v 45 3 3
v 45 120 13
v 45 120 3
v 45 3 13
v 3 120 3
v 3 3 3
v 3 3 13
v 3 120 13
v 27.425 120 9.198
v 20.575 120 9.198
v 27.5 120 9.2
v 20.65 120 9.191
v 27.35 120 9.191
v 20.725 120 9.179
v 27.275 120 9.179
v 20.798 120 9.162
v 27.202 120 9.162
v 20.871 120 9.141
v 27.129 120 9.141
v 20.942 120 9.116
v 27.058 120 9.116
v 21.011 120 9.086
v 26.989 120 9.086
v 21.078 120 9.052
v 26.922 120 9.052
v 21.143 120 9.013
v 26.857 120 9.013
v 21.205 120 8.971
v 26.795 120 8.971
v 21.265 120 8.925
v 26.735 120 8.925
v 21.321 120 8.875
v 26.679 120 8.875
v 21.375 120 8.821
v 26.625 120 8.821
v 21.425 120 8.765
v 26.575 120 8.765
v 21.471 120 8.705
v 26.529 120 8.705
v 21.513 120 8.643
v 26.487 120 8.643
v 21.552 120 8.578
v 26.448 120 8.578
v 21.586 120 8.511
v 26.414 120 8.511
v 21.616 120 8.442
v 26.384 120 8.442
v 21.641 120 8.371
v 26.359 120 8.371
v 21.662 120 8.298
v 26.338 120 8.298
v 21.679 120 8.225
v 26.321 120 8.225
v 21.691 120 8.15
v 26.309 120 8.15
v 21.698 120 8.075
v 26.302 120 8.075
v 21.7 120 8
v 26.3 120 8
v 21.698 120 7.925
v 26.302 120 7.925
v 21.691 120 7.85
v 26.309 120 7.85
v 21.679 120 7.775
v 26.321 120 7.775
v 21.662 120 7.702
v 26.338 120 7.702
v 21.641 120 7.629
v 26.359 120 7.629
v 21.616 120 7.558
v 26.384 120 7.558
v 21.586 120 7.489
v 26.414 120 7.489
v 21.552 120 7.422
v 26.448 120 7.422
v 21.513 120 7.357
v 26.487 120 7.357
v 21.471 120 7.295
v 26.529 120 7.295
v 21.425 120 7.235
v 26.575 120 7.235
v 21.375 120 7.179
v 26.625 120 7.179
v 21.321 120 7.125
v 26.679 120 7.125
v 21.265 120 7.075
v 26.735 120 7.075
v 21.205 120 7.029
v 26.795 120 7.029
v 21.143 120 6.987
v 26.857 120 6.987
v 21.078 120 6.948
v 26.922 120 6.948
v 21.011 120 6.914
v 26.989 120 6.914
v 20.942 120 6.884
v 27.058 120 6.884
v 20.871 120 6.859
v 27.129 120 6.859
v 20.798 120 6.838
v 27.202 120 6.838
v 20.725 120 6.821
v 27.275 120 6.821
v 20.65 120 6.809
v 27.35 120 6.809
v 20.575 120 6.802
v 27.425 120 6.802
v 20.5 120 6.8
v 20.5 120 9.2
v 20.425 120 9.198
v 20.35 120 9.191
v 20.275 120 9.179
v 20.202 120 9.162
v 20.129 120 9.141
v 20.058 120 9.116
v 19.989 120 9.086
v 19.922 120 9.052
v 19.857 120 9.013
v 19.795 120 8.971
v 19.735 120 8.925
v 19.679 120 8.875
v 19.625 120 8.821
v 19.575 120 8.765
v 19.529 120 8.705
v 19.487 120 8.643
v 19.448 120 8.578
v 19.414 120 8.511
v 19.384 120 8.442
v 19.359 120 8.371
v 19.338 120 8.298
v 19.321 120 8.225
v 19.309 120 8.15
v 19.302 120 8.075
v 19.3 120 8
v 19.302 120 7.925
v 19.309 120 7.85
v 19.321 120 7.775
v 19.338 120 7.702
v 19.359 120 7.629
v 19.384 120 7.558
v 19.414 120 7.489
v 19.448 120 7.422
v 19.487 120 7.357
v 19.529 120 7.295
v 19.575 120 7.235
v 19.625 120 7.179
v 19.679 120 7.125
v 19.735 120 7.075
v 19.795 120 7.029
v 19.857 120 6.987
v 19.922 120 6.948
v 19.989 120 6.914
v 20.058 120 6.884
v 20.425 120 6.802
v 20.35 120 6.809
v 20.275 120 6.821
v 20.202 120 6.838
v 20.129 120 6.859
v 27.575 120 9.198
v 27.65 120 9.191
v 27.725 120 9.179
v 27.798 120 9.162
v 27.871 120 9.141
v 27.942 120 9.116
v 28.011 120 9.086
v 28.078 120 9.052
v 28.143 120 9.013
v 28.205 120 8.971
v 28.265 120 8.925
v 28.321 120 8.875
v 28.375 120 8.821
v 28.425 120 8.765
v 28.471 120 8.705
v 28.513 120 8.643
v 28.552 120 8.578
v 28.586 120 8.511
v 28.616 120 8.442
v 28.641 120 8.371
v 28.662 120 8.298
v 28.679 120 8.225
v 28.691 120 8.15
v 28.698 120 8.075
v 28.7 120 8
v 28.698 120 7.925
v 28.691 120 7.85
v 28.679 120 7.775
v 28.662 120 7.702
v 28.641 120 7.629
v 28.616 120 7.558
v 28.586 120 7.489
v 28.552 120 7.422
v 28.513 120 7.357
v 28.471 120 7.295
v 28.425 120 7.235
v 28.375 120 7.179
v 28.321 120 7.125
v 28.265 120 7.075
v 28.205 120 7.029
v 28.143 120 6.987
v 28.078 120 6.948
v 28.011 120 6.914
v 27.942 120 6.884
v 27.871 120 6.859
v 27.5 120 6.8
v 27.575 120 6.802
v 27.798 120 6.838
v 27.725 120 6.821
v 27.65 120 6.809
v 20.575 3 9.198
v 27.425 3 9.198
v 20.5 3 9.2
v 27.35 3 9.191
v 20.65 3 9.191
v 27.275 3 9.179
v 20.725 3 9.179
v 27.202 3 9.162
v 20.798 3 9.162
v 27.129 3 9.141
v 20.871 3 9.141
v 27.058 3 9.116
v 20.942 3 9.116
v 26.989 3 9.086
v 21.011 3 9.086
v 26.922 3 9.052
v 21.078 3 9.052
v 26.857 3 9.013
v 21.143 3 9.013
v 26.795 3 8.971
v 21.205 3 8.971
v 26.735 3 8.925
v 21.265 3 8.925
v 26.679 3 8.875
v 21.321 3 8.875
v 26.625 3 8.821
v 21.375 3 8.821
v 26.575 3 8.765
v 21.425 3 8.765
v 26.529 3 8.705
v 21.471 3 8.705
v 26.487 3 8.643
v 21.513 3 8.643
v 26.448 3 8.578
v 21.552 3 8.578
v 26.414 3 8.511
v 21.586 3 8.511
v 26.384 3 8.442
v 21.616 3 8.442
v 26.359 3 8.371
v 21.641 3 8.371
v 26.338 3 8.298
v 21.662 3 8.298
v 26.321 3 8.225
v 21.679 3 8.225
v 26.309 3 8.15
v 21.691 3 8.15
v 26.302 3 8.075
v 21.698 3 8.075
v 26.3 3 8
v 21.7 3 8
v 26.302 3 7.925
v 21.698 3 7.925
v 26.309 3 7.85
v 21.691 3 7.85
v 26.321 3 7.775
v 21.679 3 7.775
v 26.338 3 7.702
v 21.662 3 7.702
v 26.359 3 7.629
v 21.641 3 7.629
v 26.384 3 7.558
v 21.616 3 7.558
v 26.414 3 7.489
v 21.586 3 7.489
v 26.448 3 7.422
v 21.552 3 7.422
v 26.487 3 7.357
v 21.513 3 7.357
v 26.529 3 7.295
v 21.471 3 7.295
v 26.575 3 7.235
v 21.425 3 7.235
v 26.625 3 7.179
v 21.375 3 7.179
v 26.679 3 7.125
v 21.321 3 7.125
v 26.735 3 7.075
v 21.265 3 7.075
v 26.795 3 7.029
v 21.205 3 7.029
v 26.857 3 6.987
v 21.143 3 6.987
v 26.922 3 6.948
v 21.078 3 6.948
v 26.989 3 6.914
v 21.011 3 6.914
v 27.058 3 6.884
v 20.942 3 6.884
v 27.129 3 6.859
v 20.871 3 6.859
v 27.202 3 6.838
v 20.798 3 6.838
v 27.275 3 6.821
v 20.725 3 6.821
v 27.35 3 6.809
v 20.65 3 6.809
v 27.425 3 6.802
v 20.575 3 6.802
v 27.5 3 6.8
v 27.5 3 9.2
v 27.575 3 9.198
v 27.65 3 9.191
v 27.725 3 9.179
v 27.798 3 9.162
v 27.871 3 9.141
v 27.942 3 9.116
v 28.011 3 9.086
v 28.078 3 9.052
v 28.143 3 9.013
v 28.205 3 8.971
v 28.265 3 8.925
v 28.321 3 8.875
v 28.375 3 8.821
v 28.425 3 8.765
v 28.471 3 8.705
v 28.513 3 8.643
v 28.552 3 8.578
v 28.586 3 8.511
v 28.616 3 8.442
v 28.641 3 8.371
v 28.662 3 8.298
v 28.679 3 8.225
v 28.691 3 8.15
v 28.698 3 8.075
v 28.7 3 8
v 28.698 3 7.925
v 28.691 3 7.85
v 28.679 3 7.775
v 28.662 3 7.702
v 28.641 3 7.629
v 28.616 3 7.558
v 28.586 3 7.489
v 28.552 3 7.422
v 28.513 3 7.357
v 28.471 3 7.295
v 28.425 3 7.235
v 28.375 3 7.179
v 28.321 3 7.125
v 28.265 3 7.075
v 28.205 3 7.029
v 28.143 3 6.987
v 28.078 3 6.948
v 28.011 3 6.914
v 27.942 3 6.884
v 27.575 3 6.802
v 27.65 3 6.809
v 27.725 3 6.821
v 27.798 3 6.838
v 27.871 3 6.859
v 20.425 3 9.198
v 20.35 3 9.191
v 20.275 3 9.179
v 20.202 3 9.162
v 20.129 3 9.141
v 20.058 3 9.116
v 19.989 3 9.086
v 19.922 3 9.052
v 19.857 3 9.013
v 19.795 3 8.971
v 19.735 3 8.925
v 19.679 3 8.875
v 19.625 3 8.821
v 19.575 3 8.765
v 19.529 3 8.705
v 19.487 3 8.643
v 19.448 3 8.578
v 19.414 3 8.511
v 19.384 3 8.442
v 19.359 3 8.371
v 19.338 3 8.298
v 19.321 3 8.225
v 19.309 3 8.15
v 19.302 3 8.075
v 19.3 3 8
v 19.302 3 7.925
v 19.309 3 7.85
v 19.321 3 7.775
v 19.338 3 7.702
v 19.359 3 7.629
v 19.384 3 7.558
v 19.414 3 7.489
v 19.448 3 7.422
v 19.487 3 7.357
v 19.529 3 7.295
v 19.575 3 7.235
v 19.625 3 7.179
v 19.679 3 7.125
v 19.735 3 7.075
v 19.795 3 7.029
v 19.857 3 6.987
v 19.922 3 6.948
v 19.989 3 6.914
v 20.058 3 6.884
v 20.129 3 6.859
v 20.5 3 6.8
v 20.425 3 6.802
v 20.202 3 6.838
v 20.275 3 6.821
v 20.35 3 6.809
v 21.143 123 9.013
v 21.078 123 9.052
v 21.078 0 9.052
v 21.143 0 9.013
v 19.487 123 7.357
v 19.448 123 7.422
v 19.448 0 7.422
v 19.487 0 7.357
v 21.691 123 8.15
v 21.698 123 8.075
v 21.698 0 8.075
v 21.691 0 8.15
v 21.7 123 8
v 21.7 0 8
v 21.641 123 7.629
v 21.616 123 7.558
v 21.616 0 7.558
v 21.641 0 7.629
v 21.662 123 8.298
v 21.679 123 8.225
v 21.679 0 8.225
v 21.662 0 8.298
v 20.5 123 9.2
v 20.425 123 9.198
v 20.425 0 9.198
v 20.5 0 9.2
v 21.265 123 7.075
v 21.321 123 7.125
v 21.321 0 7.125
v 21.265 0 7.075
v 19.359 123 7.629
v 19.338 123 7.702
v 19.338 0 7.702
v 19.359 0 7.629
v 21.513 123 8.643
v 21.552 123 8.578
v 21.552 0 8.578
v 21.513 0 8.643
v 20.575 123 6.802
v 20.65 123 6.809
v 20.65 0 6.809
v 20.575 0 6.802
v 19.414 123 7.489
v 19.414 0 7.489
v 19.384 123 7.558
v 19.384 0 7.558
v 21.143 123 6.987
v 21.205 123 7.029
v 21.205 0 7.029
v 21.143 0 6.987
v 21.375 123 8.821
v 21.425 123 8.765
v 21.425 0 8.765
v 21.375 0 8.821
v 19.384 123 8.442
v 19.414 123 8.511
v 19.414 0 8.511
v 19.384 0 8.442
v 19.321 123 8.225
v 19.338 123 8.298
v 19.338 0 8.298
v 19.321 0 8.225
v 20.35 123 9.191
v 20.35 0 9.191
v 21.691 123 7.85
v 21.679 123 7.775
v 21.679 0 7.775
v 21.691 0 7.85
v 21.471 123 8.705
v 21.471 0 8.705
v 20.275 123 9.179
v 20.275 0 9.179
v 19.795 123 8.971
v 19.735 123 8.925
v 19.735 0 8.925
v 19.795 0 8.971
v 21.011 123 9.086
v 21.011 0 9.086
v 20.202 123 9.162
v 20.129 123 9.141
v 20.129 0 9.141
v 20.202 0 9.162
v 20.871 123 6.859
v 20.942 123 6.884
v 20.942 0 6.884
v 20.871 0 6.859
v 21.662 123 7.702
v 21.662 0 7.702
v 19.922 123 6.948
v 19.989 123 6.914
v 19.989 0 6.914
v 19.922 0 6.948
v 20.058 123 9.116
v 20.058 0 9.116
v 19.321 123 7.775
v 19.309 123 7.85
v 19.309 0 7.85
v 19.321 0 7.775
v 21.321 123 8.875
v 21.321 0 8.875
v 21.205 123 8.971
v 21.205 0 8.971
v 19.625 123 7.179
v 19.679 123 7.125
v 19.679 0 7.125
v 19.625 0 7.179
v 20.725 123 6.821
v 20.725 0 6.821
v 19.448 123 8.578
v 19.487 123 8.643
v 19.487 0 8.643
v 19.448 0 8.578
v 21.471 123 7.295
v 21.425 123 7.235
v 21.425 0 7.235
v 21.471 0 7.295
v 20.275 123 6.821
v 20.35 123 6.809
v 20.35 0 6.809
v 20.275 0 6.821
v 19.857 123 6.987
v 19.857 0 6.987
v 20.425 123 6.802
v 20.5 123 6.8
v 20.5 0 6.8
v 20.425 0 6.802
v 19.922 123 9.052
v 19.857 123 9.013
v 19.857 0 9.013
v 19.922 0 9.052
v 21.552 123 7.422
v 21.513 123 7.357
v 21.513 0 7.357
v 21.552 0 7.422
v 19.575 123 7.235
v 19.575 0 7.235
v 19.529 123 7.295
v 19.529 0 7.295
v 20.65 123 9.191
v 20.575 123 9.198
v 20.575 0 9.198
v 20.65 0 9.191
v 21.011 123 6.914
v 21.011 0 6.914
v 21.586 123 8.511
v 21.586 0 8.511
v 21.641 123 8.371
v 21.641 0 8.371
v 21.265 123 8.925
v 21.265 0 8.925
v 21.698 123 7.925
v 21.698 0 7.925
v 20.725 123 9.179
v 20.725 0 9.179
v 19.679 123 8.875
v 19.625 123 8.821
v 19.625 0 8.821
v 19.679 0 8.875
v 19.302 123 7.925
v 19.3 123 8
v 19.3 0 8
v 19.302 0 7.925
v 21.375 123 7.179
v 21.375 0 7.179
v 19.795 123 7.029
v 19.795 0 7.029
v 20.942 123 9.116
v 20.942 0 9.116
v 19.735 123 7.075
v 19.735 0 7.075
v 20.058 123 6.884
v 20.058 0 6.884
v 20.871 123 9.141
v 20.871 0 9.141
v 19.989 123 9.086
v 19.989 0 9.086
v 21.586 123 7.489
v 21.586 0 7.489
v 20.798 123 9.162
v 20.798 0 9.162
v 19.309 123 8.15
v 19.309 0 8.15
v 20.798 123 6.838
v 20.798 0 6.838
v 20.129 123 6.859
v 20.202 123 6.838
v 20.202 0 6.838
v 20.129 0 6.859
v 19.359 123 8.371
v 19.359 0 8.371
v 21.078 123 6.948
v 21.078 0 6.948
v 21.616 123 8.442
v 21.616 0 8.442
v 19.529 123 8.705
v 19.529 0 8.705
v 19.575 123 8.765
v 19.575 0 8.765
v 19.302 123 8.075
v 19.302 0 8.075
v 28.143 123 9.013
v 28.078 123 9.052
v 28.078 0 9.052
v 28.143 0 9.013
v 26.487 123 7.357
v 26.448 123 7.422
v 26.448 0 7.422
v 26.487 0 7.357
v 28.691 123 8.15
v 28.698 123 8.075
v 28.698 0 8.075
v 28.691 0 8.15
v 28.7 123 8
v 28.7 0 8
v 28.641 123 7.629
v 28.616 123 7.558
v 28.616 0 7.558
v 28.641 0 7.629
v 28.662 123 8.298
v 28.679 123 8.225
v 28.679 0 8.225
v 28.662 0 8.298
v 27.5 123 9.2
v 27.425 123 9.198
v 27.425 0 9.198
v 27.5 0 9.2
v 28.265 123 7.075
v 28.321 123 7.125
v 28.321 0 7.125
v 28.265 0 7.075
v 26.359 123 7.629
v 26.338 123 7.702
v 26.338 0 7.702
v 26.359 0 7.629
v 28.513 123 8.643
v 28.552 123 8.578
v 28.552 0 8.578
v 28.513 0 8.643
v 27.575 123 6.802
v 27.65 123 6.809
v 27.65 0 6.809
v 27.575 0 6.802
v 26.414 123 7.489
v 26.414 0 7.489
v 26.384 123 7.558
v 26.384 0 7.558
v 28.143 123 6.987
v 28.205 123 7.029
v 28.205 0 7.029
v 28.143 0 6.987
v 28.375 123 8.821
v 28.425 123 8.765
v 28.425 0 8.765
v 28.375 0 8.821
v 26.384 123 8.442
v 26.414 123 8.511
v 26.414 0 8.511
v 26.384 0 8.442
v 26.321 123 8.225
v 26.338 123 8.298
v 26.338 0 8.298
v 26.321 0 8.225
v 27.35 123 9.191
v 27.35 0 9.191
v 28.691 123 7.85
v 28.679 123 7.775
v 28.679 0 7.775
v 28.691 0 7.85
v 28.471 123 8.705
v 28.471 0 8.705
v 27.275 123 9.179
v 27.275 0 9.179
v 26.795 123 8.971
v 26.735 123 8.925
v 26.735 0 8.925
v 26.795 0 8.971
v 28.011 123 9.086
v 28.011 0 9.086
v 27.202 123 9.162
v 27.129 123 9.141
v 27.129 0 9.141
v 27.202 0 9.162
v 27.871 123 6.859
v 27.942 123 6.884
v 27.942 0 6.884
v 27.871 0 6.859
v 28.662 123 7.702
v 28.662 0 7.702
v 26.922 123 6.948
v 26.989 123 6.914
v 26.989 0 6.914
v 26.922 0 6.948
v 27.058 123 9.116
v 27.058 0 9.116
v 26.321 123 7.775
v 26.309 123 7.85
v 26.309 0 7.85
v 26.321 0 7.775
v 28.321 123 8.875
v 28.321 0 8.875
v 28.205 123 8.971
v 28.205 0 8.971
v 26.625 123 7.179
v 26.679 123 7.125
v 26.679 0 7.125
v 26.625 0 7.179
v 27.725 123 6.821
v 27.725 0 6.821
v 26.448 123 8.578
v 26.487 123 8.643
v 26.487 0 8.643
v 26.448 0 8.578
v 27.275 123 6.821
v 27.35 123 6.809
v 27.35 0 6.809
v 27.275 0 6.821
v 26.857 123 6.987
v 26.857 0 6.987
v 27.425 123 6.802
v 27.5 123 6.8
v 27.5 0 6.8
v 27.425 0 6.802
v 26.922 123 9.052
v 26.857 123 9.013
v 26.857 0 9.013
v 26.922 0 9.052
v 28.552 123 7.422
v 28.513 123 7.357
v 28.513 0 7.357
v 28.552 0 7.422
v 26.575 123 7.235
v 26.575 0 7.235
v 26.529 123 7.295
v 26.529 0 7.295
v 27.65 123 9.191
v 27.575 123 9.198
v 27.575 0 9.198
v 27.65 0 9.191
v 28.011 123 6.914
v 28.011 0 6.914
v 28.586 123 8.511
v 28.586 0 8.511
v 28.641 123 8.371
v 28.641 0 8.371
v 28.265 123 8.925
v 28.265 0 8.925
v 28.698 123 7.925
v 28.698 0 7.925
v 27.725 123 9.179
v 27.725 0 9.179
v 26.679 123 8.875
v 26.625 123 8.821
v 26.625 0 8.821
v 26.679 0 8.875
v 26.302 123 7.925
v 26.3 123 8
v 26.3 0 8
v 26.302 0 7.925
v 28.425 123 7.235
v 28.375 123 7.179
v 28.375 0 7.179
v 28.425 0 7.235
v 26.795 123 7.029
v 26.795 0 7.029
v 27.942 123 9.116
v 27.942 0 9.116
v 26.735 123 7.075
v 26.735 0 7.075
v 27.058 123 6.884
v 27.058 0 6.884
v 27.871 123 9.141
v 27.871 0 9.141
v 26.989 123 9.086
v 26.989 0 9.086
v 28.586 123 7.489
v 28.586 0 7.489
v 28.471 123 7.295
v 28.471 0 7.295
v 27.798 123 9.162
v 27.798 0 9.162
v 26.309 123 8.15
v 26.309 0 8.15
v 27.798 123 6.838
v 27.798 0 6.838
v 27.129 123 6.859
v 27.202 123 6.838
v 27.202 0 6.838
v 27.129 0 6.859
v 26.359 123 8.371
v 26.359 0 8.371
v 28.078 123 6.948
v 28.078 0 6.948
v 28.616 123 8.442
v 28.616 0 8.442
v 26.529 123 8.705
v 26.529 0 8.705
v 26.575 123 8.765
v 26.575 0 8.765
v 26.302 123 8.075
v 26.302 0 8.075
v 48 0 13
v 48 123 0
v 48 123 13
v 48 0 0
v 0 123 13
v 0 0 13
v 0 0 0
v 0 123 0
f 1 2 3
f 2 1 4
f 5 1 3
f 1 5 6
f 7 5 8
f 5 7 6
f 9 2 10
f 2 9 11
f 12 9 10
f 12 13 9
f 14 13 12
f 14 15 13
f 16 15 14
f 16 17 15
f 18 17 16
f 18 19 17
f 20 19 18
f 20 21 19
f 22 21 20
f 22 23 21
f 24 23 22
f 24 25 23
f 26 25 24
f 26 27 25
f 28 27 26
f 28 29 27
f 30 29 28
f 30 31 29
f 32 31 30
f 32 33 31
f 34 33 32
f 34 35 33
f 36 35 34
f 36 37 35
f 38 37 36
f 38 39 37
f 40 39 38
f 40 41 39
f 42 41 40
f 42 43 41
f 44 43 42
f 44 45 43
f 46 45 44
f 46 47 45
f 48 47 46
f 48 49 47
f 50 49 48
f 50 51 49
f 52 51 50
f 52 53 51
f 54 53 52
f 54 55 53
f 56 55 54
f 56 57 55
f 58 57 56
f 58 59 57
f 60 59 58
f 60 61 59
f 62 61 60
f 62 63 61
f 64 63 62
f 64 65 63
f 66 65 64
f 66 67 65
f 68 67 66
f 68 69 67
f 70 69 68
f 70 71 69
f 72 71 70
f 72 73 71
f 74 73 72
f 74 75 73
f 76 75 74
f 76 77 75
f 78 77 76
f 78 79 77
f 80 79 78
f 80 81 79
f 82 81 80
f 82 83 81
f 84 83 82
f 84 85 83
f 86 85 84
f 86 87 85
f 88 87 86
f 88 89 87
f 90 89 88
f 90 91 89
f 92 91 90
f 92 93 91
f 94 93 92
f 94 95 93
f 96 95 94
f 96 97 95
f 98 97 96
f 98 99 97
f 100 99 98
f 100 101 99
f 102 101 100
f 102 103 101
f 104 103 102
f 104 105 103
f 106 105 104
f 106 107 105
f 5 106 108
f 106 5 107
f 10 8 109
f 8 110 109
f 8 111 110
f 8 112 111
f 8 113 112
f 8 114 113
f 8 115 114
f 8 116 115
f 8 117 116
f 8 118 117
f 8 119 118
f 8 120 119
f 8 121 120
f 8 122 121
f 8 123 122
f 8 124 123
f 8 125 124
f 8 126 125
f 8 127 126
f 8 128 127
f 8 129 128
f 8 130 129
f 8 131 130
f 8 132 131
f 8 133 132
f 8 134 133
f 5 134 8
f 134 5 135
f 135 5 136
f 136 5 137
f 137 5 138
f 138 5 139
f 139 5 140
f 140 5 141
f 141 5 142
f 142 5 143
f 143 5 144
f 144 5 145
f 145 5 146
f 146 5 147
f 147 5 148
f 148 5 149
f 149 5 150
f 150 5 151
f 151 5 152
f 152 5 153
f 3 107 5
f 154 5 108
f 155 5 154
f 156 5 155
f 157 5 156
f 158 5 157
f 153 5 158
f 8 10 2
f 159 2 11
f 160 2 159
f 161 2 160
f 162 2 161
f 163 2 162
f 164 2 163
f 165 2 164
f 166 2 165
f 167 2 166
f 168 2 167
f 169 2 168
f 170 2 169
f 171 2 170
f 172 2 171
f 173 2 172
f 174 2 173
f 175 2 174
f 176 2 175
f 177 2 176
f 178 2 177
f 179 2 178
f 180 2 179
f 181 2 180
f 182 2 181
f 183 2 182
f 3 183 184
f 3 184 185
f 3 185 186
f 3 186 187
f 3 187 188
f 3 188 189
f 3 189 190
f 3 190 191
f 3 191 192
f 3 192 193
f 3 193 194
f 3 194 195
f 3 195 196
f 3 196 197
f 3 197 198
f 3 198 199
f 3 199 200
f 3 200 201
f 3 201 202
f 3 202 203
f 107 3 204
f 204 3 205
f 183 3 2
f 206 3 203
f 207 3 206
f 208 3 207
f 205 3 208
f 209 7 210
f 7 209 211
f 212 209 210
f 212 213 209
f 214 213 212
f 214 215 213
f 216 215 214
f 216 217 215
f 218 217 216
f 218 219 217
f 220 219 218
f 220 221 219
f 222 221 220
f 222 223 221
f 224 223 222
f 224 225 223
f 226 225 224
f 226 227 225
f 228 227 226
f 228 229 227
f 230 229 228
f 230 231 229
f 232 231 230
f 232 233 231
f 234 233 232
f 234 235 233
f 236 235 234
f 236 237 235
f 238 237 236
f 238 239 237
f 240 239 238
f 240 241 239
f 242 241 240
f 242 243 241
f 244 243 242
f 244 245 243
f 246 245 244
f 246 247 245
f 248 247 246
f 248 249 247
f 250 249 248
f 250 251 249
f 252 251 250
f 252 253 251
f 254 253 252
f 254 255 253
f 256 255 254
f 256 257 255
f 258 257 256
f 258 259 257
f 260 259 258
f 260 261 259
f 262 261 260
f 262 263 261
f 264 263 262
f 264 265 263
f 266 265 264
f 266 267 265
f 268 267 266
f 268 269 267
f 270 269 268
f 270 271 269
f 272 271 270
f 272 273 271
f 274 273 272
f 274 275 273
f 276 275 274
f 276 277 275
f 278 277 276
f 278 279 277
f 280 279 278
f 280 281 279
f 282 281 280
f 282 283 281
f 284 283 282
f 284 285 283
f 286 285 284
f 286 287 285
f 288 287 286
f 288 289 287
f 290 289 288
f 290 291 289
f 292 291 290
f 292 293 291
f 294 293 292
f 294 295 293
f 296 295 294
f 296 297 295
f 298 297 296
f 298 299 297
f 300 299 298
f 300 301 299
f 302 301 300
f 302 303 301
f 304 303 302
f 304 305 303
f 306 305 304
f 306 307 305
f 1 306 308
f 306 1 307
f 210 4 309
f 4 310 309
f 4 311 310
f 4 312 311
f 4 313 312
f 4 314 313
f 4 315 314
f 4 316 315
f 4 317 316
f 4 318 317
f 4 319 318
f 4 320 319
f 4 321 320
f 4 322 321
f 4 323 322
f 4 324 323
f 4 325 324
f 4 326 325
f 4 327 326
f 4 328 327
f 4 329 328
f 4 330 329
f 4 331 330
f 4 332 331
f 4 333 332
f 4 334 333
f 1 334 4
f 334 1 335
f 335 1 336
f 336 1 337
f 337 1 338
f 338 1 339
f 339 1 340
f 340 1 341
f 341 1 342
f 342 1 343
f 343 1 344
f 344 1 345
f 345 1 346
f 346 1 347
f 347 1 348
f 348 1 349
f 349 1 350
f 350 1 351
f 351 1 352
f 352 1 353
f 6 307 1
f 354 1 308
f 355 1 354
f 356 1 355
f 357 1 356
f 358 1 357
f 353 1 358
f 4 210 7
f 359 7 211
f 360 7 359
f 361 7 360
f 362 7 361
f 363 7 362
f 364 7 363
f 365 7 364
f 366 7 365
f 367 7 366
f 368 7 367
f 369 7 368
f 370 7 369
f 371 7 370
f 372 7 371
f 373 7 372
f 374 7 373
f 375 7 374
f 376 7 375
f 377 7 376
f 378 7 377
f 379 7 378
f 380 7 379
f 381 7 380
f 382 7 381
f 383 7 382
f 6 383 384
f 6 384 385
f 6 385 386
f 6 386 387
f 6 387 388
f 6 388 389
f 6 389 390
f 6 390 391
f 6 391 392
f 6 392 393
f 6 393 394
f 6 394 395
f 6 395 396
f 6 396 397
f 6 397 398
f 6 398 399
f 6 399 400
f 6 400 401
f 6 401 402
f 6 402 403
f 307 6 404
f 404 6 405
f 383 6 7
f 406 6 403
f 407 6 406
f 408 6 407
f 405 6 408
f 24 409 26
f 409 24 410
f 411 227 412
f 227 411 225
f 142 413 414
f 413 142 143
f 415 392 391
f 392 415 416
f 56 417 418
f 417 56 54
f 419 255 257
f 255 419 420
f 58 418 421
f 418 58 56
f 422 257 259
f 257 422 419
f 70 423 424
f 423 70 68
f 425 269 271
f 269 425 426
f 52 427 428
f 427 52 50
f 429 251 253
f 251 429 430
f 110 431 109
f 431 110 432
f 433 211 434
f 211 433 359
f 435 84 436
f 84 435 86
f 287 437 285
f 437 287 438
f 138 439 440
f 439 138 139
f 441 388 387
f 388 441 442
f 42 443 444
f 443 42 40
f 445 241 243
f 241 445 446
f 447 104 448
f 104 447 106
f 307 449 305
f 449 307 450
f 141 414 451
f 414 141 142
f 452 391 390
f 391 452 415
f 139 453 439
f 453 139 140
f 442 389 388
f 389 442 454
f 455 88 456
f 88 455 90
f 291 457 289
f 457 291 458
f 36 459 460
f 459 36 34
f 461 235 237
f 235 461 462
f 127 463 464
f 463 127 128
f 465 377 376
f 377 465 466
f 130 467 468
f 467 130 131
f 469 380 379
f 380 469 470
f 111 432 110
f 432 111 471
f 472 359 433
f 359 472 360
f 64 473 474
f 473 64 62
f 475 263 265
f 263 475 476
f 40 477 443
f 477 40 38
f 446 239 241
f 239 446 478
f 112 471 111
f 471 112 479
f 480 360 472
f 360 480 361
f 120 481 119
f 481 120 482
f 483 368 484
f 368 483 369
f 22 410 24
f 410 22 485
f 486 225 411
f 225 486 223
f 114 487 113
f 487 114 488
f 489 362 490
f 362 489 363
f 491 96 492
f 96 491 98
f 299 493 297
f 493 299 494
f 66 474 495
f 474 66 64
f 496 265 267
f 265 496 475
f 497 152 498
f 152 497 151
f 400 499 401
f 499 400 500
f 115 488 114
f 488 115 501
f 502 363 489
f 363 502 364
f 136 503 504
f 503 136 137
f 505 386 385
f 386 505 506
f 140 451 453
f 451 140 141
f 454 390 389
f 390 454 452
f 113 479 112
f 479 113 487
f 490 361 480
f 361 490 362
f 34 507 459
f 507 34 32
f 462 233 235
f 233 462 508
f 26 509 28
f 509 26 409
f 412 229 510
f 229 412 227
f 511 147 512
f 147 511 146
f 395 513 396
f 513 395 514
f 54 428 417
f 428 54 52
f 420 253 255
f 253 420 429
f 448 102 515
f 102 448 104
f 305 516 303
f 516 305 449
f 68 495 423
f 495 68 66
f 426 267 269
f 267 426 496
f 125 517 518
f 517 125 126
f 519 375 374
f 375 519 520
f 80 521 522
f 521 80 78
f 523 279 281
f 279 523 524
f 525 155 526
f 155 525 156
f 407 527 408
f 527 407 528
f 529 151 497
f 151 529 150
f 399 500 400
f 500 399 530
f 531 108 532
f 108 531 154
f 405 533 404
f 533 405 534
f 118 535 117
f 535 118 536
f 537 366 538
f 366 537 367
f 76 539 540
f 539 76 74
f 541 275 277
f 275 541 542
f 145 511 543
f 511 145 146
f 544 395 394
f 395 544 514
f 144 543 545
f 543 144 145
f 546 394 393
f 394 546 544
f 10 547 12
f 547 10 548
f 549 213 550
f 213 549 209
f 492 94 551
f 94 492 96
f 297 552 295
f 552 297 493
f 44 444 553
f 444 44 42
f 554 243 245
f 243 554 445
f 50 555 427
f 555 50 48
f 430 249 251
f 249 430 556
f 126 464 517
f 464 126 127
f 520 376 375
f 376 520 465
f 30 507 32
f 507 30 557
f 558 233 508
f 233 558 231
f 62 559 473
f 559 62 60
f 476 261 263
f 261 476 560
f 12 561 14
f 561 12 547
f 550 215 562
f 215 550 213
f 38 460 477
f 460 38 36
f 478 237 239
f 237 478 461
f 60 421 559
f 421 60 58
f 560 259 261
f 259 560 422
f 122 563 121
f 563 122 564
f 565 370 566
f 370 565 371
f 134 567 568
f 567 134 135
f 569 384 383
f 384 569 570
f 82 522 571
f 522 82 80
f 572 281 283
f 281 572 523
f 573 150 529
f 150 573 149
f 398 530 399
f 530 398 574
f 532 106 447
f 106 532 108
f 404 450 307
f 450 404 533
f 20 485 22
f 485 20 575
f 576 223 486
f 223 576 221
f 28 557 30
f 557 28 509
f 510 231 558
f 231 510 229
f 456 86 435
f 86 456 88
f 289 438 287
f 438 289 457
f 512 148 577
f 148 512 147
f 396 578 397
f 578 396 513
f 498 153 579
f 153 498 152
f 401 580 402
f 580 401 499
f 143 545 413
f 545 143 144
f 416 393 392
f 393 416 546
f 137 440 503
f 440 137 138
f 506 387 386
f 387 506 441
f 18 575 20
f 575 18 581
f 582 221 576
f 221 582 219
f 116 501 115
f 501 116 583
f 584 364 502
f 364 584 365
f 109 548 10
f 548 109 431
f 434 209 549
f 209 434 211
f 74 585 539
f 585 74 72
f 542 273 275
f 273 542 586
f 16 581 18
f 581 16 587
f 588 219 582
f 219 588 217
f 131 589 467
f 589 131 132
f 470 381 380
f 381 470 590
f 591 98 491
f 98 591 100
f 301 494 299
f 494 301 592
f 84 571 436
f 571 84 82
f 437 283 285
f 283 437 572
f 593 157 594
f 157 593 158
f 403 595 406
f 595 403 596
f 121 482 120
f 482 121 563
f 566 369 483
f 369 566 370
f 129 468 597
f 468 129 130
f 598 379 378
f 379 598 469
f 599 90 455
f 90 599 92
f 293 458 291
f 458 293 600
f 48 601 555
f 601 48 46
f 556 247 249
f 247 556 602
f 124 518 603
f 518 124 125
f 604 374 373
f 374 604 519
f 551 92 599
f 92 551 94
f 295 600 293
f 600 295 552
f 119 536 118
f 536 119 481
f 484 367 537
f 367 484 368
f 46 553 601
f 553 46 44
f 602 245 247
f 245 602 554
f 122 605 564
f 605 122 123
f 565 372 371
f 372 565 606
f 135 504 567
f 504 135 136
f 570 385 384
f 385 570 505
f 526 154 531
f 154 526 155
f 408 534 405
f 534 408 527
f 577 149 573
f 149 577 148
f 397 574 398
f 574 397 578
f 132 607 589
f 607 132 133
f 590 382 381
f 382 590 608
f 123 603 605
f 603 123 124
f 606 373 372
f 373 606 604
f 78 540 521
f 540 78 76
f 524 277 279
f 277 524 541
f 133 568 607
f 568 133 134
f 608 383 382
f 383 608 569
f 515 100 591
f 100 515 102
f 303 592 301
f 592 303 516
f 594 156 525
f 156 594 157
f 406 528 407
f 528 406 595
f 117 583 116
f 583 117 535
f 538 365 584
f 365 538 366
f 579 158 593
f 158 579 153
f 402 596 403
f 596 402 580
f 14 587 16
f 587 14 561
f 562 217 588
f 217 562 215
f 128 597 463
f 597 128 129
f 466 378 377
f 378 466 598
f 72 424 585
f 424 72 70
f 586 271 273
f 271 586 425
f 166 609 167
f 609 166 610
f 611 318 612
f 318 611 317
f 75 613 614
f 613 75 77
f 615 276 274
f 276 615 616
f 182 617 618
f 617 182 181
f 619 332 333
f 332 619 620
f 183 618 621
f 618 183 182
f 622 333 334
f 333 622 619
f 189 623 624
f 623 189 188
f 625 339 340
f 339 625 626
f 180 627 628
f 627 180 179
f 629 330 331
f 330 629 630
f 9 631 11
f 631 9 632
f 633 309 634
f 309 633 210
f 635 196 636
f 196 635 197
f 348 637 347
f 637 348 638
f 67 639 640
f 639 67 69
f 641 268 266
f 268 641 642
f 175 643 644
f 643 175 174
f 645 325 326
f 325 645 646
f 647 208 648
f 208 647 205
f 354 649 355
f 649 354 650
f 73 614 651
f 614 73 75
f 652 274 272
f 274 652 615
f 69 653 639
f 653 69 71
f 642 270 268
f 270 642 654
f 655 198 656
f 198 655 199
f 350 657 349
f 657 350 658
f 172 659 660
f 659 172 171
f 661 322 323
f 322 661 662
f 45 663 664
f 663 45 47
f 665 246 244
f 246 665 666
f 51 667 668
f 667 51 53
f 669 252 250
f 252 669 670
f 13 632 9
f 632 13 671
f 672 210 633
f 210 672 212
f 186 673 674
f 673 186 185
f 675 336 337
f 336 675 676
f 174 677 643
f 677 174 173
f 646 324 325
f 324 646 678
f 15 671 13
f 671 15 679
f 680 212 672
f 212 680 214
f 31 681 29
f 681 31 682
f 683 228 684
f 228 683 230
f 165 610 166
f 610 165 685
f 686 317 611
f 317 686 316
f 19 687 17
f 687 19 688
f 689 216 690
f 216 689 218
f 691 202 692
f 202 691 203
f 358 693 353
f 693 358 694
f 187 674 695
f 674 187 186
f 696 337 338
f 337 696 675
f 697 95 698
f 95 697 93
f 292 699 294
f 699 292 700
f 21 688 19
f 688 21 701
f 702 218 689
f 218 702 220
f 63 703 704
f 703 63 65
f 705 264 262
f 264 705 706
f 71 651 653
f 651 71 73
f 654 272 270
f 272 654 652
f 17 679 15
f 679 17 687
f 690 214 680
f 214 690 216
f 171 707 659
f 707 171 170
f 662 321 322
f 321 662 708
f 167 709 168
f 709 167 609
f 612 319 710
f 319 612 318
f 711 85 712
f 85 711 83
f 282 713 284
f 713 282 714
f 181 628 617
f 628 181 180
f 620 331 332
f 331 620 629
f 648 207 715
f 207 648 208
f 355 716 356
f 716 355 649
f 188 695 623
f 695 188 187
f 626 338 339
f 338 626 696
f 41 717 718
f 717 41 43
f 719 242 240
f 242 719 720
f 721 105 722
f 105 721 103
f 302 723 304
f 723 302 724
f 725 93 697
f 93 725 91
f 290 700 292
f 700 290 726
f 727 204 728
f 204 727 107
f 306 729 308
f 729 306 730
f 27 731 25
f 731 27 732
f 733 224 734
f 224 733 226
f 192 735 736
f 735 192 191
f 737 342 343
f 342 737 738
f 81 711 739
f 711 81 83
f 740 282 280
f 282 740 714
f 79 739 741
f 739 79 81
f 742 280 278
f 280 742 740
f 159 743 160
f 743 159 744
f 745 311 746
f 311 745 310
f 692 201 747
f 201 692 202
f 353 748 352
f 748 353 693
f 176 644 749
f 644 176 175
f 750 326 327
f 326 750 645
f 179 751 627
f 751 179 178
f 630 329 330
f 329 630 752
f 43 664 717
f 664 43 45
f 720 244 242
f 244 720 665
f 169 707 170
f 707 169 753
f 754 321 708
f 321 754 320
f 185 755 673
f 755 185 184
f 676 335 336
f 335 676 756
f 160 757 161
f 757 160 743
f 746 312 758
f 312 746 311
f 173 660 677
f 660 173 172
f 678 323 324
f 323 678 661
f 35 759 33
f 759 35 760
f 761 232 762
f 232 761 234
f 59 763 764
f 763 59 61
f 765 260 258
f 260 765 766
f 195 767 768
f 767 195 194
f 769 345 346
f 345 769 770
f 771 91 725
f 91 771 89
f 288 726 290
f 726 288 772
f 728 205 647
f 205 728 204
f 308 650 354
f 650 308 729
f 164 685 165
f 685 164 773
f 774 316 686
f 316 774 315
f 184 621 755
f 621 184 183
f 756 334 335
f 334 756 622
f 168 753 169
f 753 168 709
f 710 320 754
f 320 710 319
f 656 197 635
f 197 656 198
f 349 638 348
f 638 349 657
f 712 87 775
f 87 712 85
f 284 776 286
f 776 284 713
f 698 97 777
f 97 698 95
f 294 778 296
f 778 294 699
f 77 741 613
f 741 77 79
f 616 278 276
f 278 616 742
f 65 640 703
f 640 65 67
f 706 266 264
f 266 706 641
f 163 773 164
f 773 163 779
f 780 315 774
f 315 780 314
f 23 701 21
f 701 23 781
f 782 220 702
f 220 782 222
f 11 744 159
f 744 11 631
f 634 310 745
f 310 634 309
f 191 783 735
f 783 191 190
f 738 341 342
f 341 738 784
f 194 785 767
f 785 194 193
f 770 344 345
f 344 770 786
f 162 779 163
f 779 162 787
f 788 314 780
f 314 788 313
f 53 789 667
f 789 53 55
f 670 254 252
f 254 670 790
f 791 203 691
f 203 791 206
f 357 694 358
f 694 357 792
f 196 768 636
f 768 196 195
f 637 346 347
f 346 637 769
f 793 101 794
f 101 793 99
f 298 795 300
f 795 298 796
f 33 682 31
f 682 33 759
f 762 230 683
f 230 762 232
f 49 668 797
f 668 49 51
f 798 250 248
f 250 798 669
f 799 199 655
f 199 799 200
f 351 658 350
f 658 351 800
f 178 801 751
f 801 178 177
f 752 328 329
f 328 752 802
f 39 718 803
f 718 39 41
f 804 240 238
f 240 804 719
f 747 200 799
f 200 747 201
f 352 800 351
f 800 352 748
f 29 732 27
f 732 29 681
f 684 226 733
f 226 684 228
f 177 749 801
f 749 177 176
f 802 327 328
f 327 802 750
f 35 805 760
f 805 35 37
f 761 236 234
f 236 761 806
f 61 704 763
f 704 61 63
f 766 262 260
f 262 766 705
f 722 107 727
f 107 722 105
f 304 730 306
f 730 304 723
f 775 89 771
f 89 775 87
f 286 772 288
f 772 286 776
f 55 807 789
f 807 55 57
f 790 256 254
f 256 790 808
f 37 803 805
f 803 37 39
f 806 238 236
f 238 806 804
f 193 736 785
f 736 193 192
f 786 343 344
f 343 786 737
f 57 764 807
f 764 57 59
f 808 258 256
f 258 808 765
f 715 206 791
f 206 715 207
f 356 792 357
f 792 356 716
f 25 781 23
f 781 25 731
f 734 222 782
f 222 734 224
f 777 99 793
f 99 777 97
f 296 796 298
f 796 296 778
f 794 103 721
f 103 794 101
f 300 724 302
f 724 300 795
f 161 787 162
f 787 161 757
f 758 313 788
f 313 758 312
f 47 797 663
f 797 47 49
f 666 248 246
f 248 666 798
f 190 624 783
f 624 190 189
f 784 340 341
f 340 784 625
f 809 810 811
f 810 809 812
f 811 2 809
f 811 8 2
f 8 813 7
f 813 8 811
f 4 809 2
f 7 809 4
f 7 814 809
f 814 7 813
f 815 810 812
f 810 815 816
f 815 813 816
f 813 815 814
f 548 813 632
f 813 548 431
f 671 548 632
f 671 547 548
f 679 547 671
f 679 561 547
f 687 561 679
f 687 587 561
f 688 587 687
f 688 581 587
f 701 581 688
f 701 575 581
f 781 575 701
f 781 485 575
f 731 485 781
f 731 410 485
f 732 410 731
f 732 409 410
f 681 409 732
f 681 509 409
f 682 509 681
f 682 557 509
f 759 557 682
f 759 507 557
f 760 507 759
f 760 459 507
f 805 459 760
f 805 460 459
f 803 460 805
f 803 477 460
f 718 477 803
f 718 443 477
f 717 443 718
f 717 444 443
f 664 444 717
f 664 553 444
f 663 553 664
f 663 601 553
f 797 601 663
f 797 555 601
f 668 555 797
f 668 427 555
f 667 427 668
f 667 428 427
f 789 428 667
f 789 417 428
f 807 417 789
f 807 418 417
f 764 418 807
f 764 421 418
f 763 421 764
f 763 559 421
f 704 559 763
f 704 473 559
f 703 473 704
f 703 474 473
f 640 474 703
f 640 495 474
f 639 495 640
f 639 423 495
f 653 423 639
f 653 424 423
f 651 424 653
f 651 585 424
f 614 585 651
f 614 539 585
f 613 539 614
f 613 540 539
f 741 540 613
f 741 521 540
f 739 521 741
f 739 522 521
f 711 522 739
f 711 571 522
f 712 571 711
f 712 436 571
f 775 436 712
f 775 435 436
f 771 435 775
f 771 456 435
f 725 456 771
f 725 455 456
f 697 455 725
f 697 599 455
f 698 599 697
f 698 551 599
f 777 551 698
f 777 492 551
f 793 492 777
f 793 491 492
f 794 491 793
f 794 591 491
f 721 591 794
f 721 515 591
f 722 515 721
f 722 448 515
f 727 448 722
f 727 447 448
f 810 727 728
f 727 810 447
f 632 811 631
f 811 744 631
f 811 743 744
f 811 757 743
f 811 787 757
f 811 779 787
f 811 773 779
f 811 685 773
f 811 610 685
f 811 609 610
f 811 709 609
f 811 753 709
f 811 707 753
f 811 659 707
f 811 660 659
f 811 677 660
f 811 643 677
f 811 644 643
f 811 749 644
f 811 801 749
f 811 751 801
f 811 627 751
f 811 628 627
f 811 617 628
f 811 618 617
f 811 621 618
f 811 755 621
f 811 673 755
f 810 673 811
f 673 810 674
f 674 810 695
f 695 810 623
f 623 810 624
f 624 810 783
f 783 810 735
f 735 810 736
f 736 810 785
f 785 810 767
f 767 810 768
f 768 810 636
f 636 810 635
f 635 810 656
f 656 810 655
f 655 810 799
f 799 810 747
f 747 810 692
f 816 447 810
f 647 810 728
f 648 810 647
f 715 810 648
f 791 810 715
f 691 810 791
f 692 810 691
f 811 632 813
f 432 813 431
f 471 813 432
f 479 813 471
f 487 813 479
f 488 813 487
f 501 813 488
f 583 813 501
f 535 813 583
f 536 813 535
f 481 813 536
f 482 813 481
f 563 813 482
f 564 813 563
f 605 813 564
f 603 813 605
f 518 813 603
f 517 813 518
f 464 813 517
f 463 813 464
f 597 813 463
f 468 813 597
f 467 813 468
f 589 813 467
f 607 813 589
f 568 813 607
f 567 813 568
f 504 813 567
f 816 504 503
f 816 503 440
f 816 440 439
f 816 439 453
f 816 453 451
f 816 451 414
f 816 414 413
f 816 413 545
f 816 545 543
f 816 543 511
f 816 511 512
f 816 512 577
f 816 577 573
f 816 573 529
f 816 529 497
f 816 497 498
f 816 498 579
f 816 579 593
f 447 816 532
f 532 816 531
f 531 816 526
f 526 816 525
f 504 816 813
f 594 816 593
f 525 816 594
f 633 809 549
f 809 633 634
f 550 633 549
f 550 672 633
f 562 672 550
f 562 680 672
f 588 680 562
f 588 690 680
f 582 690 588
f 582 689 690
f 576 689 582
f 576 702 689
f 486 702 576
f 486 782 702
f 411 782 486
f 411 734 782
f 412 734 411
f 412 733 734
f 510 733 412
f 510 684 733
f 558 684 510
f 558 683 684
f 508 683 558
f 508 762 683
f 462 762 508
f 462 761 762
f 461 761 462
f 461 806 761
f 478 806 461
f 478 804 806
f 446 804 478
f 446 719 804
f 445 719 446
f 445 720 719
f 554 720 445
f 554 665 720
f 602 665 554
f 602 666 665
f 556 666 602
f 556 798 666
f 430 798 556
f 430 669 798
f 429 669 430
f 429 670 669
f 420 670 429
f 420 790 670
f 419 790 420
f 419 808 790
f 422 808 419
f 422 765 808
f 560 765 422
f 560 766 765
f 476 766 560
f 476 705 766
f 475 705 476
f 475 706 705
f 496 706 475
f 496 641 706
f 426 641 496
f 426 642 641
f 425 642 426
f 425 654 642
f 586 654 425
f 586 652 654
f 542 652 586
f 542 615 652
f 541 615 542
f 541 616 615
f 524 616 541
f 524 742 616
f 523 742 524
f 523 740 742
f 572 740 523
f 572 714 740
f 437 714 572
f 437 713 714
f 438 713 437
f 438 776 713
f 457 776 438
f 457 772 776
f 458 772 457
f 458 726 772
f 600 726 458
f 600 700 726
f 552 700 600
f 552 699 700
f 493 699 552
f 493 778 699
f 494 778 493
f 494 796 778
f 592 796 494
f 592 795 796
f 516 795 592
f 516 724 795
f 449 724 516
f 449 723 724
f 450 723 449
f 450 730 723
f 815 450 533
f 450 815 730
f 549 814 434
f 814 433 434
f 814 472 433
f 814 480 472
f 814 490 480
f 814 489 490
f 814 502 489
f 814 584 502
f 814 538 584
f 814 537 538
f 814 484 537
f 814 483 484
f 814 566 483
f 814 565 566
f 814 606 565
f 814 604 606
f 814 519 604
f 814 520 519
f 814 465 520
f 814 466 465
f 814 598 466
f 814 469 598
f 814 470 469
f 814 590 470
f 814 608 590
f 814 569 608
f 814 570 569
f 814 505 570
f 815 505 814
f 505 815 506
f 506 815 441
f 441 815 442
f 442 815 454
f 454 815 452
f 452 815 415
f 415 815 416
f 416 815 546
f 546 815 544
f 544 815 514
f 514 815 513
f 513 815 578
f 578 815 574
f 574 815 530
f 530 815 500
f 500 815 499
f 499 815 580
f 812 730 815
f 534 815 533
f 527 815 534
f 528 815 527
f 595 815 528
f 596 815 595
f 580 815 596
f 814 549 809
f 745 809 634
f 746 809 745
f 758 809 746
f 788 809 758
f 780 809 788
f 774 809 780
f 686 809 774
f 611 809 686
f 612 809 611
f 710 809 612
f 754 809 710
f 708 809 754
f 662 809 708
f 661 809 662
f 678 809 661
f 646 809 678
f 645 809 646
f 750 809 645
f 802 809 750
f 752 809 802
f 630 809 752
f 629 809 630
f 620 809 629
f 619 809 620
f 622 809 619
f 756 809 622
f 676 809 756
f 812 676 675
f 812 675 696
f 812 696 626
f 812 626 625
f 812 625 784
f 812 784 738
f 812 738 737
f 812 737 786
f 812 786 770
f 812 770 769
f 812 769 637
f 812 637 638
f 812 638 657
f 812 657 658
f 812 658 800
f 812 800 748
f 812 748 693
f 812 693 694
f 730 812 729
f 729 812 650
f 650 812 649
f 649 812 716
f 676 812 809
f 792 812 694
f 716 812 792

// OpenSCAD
difference(){
	union(){ 

        translate([0,0,0]){
           cube([42+6,123,13], center=false);
        }
        

	}
	union() {
        translate([3,3,3]){
           cube([42,123-6,30], center=false);
        }
        translate([48/2-3.5,200,8]){
            rotate([90,0,0]){
                cylinder(h=2000, r=1.2, $fn=100, center=false);
            }
        }
        translate([48/2+3.5,200,8]){
            rotate([90,0,0]){
                cylinder(h=2000, r=1.2, $fn=100, center=false);
            }
        }
	}
}
